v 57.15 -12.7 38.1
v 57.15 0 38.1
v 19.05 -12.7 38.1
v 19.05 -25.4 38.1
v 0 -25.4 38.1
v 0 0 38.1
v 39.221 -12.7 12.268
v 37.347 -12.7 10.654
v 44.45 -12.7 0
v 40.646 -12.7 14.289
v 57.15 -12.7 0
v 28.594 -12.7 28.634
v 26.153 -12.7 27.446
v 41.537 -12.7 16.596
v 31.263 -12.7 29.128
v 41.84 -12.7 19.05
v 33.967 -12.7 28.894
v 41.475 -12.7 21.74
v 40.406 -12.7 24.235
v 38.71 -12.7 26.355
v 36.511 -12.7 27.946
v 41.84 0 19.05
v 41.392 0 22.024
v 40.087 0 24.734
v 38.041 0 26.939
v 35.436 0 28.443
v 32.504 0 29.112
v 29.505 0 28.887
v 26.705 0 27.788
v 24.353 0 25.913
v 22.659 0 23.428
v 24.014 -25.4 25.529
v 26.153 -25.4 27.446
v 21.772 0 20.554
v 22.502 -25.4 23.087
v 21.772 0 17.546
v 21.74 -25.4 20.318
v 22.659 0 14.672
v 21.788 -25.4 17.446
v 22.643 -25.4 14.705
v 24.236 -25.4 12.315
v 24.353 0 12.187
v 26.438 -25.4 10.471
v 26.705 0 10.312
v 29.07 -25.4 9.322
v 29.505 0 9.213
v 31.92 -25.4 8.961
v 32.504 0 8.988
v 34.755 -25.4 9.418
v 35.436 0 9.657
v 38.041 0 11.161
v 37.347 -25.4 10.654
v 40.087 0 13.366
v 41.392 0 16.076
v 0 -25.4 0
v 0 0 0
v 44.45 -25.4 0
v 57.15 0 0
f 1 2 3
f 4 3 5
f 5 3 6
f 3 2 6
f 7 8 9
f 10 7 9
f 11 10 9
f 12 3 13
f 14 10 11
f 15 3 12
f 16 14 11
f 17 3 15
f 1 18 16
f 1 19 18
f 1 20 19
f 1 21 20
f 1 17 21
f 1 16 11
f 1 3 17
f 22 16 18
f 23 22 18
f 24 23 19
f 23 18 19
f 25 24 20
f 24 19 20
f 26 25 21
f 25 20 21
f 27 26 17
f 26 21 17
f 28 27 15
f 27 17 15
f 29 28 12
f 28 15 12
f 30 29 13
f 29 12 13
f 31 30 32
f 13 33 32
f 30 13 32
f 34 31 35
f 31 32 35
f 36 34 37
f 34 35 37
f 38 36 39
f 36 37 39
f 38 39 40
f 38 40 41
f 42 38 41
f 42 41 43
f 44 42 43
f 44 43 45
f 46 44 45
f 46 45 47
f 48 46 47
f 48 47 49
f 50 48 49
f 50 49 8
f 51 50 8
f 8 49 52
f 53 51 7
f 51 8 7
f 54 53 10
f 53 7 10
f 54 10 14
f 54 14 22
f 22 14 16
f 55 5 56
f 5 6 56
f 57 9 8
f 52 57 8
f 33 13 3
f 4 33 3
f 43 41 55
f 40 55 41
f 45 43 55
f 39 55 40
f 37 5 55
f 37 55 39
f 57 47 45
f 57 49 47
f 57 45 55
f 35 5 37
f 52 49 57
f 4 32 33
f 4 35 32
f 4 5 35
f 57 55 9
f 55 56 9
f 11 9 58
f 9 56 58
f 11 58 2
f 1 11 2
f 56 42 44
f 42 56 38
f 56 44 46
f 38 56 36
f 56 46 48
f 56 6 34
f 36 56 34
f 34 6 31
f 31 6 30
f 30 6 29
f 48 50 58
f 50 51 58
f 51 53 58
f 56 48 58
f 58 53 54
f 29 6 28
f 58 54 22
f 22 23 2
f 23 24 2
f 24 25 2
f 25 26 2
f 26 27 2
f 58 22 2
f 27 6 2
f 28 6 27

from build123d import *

# Parameters (mm, degrees)
F0_W     = 57.15
F0_H     = 38.1
F1_DEPTH = 12.7
F3_DEPTH = 12.7
F4_R     = 10.090212
F5_DEPTH = 25.4


with BuildPart() as f1:
    # F0 (on Front) → F1 (new body)
    with BuildSketch(Plane.XZ):
        with Locations((28.575, 19.05)):
            Rectangle(F0_W, F0_H)
    extrude(amount=F1_DEPTH)

    # F2 (on face) → F3 (join)
    with BuildSketch(Plane.XZ.offset(12.7)):
        Polygon((19.05, 38.1), (0, 38.1), (0, 0), (44.45, 0), align=None)
    extrude(amount=F3_DEPTH)

    # F4 (on face) → F5 (cut)
    with BuildSketch(Plane.XZ.offset(25.4)):
        with Locations((31.75, 19.05)):
            Circle(F4_R)
    extrude(amount=-F5_DEPTH, mode=Mode.SUBTRACT)


solid = f1.part
